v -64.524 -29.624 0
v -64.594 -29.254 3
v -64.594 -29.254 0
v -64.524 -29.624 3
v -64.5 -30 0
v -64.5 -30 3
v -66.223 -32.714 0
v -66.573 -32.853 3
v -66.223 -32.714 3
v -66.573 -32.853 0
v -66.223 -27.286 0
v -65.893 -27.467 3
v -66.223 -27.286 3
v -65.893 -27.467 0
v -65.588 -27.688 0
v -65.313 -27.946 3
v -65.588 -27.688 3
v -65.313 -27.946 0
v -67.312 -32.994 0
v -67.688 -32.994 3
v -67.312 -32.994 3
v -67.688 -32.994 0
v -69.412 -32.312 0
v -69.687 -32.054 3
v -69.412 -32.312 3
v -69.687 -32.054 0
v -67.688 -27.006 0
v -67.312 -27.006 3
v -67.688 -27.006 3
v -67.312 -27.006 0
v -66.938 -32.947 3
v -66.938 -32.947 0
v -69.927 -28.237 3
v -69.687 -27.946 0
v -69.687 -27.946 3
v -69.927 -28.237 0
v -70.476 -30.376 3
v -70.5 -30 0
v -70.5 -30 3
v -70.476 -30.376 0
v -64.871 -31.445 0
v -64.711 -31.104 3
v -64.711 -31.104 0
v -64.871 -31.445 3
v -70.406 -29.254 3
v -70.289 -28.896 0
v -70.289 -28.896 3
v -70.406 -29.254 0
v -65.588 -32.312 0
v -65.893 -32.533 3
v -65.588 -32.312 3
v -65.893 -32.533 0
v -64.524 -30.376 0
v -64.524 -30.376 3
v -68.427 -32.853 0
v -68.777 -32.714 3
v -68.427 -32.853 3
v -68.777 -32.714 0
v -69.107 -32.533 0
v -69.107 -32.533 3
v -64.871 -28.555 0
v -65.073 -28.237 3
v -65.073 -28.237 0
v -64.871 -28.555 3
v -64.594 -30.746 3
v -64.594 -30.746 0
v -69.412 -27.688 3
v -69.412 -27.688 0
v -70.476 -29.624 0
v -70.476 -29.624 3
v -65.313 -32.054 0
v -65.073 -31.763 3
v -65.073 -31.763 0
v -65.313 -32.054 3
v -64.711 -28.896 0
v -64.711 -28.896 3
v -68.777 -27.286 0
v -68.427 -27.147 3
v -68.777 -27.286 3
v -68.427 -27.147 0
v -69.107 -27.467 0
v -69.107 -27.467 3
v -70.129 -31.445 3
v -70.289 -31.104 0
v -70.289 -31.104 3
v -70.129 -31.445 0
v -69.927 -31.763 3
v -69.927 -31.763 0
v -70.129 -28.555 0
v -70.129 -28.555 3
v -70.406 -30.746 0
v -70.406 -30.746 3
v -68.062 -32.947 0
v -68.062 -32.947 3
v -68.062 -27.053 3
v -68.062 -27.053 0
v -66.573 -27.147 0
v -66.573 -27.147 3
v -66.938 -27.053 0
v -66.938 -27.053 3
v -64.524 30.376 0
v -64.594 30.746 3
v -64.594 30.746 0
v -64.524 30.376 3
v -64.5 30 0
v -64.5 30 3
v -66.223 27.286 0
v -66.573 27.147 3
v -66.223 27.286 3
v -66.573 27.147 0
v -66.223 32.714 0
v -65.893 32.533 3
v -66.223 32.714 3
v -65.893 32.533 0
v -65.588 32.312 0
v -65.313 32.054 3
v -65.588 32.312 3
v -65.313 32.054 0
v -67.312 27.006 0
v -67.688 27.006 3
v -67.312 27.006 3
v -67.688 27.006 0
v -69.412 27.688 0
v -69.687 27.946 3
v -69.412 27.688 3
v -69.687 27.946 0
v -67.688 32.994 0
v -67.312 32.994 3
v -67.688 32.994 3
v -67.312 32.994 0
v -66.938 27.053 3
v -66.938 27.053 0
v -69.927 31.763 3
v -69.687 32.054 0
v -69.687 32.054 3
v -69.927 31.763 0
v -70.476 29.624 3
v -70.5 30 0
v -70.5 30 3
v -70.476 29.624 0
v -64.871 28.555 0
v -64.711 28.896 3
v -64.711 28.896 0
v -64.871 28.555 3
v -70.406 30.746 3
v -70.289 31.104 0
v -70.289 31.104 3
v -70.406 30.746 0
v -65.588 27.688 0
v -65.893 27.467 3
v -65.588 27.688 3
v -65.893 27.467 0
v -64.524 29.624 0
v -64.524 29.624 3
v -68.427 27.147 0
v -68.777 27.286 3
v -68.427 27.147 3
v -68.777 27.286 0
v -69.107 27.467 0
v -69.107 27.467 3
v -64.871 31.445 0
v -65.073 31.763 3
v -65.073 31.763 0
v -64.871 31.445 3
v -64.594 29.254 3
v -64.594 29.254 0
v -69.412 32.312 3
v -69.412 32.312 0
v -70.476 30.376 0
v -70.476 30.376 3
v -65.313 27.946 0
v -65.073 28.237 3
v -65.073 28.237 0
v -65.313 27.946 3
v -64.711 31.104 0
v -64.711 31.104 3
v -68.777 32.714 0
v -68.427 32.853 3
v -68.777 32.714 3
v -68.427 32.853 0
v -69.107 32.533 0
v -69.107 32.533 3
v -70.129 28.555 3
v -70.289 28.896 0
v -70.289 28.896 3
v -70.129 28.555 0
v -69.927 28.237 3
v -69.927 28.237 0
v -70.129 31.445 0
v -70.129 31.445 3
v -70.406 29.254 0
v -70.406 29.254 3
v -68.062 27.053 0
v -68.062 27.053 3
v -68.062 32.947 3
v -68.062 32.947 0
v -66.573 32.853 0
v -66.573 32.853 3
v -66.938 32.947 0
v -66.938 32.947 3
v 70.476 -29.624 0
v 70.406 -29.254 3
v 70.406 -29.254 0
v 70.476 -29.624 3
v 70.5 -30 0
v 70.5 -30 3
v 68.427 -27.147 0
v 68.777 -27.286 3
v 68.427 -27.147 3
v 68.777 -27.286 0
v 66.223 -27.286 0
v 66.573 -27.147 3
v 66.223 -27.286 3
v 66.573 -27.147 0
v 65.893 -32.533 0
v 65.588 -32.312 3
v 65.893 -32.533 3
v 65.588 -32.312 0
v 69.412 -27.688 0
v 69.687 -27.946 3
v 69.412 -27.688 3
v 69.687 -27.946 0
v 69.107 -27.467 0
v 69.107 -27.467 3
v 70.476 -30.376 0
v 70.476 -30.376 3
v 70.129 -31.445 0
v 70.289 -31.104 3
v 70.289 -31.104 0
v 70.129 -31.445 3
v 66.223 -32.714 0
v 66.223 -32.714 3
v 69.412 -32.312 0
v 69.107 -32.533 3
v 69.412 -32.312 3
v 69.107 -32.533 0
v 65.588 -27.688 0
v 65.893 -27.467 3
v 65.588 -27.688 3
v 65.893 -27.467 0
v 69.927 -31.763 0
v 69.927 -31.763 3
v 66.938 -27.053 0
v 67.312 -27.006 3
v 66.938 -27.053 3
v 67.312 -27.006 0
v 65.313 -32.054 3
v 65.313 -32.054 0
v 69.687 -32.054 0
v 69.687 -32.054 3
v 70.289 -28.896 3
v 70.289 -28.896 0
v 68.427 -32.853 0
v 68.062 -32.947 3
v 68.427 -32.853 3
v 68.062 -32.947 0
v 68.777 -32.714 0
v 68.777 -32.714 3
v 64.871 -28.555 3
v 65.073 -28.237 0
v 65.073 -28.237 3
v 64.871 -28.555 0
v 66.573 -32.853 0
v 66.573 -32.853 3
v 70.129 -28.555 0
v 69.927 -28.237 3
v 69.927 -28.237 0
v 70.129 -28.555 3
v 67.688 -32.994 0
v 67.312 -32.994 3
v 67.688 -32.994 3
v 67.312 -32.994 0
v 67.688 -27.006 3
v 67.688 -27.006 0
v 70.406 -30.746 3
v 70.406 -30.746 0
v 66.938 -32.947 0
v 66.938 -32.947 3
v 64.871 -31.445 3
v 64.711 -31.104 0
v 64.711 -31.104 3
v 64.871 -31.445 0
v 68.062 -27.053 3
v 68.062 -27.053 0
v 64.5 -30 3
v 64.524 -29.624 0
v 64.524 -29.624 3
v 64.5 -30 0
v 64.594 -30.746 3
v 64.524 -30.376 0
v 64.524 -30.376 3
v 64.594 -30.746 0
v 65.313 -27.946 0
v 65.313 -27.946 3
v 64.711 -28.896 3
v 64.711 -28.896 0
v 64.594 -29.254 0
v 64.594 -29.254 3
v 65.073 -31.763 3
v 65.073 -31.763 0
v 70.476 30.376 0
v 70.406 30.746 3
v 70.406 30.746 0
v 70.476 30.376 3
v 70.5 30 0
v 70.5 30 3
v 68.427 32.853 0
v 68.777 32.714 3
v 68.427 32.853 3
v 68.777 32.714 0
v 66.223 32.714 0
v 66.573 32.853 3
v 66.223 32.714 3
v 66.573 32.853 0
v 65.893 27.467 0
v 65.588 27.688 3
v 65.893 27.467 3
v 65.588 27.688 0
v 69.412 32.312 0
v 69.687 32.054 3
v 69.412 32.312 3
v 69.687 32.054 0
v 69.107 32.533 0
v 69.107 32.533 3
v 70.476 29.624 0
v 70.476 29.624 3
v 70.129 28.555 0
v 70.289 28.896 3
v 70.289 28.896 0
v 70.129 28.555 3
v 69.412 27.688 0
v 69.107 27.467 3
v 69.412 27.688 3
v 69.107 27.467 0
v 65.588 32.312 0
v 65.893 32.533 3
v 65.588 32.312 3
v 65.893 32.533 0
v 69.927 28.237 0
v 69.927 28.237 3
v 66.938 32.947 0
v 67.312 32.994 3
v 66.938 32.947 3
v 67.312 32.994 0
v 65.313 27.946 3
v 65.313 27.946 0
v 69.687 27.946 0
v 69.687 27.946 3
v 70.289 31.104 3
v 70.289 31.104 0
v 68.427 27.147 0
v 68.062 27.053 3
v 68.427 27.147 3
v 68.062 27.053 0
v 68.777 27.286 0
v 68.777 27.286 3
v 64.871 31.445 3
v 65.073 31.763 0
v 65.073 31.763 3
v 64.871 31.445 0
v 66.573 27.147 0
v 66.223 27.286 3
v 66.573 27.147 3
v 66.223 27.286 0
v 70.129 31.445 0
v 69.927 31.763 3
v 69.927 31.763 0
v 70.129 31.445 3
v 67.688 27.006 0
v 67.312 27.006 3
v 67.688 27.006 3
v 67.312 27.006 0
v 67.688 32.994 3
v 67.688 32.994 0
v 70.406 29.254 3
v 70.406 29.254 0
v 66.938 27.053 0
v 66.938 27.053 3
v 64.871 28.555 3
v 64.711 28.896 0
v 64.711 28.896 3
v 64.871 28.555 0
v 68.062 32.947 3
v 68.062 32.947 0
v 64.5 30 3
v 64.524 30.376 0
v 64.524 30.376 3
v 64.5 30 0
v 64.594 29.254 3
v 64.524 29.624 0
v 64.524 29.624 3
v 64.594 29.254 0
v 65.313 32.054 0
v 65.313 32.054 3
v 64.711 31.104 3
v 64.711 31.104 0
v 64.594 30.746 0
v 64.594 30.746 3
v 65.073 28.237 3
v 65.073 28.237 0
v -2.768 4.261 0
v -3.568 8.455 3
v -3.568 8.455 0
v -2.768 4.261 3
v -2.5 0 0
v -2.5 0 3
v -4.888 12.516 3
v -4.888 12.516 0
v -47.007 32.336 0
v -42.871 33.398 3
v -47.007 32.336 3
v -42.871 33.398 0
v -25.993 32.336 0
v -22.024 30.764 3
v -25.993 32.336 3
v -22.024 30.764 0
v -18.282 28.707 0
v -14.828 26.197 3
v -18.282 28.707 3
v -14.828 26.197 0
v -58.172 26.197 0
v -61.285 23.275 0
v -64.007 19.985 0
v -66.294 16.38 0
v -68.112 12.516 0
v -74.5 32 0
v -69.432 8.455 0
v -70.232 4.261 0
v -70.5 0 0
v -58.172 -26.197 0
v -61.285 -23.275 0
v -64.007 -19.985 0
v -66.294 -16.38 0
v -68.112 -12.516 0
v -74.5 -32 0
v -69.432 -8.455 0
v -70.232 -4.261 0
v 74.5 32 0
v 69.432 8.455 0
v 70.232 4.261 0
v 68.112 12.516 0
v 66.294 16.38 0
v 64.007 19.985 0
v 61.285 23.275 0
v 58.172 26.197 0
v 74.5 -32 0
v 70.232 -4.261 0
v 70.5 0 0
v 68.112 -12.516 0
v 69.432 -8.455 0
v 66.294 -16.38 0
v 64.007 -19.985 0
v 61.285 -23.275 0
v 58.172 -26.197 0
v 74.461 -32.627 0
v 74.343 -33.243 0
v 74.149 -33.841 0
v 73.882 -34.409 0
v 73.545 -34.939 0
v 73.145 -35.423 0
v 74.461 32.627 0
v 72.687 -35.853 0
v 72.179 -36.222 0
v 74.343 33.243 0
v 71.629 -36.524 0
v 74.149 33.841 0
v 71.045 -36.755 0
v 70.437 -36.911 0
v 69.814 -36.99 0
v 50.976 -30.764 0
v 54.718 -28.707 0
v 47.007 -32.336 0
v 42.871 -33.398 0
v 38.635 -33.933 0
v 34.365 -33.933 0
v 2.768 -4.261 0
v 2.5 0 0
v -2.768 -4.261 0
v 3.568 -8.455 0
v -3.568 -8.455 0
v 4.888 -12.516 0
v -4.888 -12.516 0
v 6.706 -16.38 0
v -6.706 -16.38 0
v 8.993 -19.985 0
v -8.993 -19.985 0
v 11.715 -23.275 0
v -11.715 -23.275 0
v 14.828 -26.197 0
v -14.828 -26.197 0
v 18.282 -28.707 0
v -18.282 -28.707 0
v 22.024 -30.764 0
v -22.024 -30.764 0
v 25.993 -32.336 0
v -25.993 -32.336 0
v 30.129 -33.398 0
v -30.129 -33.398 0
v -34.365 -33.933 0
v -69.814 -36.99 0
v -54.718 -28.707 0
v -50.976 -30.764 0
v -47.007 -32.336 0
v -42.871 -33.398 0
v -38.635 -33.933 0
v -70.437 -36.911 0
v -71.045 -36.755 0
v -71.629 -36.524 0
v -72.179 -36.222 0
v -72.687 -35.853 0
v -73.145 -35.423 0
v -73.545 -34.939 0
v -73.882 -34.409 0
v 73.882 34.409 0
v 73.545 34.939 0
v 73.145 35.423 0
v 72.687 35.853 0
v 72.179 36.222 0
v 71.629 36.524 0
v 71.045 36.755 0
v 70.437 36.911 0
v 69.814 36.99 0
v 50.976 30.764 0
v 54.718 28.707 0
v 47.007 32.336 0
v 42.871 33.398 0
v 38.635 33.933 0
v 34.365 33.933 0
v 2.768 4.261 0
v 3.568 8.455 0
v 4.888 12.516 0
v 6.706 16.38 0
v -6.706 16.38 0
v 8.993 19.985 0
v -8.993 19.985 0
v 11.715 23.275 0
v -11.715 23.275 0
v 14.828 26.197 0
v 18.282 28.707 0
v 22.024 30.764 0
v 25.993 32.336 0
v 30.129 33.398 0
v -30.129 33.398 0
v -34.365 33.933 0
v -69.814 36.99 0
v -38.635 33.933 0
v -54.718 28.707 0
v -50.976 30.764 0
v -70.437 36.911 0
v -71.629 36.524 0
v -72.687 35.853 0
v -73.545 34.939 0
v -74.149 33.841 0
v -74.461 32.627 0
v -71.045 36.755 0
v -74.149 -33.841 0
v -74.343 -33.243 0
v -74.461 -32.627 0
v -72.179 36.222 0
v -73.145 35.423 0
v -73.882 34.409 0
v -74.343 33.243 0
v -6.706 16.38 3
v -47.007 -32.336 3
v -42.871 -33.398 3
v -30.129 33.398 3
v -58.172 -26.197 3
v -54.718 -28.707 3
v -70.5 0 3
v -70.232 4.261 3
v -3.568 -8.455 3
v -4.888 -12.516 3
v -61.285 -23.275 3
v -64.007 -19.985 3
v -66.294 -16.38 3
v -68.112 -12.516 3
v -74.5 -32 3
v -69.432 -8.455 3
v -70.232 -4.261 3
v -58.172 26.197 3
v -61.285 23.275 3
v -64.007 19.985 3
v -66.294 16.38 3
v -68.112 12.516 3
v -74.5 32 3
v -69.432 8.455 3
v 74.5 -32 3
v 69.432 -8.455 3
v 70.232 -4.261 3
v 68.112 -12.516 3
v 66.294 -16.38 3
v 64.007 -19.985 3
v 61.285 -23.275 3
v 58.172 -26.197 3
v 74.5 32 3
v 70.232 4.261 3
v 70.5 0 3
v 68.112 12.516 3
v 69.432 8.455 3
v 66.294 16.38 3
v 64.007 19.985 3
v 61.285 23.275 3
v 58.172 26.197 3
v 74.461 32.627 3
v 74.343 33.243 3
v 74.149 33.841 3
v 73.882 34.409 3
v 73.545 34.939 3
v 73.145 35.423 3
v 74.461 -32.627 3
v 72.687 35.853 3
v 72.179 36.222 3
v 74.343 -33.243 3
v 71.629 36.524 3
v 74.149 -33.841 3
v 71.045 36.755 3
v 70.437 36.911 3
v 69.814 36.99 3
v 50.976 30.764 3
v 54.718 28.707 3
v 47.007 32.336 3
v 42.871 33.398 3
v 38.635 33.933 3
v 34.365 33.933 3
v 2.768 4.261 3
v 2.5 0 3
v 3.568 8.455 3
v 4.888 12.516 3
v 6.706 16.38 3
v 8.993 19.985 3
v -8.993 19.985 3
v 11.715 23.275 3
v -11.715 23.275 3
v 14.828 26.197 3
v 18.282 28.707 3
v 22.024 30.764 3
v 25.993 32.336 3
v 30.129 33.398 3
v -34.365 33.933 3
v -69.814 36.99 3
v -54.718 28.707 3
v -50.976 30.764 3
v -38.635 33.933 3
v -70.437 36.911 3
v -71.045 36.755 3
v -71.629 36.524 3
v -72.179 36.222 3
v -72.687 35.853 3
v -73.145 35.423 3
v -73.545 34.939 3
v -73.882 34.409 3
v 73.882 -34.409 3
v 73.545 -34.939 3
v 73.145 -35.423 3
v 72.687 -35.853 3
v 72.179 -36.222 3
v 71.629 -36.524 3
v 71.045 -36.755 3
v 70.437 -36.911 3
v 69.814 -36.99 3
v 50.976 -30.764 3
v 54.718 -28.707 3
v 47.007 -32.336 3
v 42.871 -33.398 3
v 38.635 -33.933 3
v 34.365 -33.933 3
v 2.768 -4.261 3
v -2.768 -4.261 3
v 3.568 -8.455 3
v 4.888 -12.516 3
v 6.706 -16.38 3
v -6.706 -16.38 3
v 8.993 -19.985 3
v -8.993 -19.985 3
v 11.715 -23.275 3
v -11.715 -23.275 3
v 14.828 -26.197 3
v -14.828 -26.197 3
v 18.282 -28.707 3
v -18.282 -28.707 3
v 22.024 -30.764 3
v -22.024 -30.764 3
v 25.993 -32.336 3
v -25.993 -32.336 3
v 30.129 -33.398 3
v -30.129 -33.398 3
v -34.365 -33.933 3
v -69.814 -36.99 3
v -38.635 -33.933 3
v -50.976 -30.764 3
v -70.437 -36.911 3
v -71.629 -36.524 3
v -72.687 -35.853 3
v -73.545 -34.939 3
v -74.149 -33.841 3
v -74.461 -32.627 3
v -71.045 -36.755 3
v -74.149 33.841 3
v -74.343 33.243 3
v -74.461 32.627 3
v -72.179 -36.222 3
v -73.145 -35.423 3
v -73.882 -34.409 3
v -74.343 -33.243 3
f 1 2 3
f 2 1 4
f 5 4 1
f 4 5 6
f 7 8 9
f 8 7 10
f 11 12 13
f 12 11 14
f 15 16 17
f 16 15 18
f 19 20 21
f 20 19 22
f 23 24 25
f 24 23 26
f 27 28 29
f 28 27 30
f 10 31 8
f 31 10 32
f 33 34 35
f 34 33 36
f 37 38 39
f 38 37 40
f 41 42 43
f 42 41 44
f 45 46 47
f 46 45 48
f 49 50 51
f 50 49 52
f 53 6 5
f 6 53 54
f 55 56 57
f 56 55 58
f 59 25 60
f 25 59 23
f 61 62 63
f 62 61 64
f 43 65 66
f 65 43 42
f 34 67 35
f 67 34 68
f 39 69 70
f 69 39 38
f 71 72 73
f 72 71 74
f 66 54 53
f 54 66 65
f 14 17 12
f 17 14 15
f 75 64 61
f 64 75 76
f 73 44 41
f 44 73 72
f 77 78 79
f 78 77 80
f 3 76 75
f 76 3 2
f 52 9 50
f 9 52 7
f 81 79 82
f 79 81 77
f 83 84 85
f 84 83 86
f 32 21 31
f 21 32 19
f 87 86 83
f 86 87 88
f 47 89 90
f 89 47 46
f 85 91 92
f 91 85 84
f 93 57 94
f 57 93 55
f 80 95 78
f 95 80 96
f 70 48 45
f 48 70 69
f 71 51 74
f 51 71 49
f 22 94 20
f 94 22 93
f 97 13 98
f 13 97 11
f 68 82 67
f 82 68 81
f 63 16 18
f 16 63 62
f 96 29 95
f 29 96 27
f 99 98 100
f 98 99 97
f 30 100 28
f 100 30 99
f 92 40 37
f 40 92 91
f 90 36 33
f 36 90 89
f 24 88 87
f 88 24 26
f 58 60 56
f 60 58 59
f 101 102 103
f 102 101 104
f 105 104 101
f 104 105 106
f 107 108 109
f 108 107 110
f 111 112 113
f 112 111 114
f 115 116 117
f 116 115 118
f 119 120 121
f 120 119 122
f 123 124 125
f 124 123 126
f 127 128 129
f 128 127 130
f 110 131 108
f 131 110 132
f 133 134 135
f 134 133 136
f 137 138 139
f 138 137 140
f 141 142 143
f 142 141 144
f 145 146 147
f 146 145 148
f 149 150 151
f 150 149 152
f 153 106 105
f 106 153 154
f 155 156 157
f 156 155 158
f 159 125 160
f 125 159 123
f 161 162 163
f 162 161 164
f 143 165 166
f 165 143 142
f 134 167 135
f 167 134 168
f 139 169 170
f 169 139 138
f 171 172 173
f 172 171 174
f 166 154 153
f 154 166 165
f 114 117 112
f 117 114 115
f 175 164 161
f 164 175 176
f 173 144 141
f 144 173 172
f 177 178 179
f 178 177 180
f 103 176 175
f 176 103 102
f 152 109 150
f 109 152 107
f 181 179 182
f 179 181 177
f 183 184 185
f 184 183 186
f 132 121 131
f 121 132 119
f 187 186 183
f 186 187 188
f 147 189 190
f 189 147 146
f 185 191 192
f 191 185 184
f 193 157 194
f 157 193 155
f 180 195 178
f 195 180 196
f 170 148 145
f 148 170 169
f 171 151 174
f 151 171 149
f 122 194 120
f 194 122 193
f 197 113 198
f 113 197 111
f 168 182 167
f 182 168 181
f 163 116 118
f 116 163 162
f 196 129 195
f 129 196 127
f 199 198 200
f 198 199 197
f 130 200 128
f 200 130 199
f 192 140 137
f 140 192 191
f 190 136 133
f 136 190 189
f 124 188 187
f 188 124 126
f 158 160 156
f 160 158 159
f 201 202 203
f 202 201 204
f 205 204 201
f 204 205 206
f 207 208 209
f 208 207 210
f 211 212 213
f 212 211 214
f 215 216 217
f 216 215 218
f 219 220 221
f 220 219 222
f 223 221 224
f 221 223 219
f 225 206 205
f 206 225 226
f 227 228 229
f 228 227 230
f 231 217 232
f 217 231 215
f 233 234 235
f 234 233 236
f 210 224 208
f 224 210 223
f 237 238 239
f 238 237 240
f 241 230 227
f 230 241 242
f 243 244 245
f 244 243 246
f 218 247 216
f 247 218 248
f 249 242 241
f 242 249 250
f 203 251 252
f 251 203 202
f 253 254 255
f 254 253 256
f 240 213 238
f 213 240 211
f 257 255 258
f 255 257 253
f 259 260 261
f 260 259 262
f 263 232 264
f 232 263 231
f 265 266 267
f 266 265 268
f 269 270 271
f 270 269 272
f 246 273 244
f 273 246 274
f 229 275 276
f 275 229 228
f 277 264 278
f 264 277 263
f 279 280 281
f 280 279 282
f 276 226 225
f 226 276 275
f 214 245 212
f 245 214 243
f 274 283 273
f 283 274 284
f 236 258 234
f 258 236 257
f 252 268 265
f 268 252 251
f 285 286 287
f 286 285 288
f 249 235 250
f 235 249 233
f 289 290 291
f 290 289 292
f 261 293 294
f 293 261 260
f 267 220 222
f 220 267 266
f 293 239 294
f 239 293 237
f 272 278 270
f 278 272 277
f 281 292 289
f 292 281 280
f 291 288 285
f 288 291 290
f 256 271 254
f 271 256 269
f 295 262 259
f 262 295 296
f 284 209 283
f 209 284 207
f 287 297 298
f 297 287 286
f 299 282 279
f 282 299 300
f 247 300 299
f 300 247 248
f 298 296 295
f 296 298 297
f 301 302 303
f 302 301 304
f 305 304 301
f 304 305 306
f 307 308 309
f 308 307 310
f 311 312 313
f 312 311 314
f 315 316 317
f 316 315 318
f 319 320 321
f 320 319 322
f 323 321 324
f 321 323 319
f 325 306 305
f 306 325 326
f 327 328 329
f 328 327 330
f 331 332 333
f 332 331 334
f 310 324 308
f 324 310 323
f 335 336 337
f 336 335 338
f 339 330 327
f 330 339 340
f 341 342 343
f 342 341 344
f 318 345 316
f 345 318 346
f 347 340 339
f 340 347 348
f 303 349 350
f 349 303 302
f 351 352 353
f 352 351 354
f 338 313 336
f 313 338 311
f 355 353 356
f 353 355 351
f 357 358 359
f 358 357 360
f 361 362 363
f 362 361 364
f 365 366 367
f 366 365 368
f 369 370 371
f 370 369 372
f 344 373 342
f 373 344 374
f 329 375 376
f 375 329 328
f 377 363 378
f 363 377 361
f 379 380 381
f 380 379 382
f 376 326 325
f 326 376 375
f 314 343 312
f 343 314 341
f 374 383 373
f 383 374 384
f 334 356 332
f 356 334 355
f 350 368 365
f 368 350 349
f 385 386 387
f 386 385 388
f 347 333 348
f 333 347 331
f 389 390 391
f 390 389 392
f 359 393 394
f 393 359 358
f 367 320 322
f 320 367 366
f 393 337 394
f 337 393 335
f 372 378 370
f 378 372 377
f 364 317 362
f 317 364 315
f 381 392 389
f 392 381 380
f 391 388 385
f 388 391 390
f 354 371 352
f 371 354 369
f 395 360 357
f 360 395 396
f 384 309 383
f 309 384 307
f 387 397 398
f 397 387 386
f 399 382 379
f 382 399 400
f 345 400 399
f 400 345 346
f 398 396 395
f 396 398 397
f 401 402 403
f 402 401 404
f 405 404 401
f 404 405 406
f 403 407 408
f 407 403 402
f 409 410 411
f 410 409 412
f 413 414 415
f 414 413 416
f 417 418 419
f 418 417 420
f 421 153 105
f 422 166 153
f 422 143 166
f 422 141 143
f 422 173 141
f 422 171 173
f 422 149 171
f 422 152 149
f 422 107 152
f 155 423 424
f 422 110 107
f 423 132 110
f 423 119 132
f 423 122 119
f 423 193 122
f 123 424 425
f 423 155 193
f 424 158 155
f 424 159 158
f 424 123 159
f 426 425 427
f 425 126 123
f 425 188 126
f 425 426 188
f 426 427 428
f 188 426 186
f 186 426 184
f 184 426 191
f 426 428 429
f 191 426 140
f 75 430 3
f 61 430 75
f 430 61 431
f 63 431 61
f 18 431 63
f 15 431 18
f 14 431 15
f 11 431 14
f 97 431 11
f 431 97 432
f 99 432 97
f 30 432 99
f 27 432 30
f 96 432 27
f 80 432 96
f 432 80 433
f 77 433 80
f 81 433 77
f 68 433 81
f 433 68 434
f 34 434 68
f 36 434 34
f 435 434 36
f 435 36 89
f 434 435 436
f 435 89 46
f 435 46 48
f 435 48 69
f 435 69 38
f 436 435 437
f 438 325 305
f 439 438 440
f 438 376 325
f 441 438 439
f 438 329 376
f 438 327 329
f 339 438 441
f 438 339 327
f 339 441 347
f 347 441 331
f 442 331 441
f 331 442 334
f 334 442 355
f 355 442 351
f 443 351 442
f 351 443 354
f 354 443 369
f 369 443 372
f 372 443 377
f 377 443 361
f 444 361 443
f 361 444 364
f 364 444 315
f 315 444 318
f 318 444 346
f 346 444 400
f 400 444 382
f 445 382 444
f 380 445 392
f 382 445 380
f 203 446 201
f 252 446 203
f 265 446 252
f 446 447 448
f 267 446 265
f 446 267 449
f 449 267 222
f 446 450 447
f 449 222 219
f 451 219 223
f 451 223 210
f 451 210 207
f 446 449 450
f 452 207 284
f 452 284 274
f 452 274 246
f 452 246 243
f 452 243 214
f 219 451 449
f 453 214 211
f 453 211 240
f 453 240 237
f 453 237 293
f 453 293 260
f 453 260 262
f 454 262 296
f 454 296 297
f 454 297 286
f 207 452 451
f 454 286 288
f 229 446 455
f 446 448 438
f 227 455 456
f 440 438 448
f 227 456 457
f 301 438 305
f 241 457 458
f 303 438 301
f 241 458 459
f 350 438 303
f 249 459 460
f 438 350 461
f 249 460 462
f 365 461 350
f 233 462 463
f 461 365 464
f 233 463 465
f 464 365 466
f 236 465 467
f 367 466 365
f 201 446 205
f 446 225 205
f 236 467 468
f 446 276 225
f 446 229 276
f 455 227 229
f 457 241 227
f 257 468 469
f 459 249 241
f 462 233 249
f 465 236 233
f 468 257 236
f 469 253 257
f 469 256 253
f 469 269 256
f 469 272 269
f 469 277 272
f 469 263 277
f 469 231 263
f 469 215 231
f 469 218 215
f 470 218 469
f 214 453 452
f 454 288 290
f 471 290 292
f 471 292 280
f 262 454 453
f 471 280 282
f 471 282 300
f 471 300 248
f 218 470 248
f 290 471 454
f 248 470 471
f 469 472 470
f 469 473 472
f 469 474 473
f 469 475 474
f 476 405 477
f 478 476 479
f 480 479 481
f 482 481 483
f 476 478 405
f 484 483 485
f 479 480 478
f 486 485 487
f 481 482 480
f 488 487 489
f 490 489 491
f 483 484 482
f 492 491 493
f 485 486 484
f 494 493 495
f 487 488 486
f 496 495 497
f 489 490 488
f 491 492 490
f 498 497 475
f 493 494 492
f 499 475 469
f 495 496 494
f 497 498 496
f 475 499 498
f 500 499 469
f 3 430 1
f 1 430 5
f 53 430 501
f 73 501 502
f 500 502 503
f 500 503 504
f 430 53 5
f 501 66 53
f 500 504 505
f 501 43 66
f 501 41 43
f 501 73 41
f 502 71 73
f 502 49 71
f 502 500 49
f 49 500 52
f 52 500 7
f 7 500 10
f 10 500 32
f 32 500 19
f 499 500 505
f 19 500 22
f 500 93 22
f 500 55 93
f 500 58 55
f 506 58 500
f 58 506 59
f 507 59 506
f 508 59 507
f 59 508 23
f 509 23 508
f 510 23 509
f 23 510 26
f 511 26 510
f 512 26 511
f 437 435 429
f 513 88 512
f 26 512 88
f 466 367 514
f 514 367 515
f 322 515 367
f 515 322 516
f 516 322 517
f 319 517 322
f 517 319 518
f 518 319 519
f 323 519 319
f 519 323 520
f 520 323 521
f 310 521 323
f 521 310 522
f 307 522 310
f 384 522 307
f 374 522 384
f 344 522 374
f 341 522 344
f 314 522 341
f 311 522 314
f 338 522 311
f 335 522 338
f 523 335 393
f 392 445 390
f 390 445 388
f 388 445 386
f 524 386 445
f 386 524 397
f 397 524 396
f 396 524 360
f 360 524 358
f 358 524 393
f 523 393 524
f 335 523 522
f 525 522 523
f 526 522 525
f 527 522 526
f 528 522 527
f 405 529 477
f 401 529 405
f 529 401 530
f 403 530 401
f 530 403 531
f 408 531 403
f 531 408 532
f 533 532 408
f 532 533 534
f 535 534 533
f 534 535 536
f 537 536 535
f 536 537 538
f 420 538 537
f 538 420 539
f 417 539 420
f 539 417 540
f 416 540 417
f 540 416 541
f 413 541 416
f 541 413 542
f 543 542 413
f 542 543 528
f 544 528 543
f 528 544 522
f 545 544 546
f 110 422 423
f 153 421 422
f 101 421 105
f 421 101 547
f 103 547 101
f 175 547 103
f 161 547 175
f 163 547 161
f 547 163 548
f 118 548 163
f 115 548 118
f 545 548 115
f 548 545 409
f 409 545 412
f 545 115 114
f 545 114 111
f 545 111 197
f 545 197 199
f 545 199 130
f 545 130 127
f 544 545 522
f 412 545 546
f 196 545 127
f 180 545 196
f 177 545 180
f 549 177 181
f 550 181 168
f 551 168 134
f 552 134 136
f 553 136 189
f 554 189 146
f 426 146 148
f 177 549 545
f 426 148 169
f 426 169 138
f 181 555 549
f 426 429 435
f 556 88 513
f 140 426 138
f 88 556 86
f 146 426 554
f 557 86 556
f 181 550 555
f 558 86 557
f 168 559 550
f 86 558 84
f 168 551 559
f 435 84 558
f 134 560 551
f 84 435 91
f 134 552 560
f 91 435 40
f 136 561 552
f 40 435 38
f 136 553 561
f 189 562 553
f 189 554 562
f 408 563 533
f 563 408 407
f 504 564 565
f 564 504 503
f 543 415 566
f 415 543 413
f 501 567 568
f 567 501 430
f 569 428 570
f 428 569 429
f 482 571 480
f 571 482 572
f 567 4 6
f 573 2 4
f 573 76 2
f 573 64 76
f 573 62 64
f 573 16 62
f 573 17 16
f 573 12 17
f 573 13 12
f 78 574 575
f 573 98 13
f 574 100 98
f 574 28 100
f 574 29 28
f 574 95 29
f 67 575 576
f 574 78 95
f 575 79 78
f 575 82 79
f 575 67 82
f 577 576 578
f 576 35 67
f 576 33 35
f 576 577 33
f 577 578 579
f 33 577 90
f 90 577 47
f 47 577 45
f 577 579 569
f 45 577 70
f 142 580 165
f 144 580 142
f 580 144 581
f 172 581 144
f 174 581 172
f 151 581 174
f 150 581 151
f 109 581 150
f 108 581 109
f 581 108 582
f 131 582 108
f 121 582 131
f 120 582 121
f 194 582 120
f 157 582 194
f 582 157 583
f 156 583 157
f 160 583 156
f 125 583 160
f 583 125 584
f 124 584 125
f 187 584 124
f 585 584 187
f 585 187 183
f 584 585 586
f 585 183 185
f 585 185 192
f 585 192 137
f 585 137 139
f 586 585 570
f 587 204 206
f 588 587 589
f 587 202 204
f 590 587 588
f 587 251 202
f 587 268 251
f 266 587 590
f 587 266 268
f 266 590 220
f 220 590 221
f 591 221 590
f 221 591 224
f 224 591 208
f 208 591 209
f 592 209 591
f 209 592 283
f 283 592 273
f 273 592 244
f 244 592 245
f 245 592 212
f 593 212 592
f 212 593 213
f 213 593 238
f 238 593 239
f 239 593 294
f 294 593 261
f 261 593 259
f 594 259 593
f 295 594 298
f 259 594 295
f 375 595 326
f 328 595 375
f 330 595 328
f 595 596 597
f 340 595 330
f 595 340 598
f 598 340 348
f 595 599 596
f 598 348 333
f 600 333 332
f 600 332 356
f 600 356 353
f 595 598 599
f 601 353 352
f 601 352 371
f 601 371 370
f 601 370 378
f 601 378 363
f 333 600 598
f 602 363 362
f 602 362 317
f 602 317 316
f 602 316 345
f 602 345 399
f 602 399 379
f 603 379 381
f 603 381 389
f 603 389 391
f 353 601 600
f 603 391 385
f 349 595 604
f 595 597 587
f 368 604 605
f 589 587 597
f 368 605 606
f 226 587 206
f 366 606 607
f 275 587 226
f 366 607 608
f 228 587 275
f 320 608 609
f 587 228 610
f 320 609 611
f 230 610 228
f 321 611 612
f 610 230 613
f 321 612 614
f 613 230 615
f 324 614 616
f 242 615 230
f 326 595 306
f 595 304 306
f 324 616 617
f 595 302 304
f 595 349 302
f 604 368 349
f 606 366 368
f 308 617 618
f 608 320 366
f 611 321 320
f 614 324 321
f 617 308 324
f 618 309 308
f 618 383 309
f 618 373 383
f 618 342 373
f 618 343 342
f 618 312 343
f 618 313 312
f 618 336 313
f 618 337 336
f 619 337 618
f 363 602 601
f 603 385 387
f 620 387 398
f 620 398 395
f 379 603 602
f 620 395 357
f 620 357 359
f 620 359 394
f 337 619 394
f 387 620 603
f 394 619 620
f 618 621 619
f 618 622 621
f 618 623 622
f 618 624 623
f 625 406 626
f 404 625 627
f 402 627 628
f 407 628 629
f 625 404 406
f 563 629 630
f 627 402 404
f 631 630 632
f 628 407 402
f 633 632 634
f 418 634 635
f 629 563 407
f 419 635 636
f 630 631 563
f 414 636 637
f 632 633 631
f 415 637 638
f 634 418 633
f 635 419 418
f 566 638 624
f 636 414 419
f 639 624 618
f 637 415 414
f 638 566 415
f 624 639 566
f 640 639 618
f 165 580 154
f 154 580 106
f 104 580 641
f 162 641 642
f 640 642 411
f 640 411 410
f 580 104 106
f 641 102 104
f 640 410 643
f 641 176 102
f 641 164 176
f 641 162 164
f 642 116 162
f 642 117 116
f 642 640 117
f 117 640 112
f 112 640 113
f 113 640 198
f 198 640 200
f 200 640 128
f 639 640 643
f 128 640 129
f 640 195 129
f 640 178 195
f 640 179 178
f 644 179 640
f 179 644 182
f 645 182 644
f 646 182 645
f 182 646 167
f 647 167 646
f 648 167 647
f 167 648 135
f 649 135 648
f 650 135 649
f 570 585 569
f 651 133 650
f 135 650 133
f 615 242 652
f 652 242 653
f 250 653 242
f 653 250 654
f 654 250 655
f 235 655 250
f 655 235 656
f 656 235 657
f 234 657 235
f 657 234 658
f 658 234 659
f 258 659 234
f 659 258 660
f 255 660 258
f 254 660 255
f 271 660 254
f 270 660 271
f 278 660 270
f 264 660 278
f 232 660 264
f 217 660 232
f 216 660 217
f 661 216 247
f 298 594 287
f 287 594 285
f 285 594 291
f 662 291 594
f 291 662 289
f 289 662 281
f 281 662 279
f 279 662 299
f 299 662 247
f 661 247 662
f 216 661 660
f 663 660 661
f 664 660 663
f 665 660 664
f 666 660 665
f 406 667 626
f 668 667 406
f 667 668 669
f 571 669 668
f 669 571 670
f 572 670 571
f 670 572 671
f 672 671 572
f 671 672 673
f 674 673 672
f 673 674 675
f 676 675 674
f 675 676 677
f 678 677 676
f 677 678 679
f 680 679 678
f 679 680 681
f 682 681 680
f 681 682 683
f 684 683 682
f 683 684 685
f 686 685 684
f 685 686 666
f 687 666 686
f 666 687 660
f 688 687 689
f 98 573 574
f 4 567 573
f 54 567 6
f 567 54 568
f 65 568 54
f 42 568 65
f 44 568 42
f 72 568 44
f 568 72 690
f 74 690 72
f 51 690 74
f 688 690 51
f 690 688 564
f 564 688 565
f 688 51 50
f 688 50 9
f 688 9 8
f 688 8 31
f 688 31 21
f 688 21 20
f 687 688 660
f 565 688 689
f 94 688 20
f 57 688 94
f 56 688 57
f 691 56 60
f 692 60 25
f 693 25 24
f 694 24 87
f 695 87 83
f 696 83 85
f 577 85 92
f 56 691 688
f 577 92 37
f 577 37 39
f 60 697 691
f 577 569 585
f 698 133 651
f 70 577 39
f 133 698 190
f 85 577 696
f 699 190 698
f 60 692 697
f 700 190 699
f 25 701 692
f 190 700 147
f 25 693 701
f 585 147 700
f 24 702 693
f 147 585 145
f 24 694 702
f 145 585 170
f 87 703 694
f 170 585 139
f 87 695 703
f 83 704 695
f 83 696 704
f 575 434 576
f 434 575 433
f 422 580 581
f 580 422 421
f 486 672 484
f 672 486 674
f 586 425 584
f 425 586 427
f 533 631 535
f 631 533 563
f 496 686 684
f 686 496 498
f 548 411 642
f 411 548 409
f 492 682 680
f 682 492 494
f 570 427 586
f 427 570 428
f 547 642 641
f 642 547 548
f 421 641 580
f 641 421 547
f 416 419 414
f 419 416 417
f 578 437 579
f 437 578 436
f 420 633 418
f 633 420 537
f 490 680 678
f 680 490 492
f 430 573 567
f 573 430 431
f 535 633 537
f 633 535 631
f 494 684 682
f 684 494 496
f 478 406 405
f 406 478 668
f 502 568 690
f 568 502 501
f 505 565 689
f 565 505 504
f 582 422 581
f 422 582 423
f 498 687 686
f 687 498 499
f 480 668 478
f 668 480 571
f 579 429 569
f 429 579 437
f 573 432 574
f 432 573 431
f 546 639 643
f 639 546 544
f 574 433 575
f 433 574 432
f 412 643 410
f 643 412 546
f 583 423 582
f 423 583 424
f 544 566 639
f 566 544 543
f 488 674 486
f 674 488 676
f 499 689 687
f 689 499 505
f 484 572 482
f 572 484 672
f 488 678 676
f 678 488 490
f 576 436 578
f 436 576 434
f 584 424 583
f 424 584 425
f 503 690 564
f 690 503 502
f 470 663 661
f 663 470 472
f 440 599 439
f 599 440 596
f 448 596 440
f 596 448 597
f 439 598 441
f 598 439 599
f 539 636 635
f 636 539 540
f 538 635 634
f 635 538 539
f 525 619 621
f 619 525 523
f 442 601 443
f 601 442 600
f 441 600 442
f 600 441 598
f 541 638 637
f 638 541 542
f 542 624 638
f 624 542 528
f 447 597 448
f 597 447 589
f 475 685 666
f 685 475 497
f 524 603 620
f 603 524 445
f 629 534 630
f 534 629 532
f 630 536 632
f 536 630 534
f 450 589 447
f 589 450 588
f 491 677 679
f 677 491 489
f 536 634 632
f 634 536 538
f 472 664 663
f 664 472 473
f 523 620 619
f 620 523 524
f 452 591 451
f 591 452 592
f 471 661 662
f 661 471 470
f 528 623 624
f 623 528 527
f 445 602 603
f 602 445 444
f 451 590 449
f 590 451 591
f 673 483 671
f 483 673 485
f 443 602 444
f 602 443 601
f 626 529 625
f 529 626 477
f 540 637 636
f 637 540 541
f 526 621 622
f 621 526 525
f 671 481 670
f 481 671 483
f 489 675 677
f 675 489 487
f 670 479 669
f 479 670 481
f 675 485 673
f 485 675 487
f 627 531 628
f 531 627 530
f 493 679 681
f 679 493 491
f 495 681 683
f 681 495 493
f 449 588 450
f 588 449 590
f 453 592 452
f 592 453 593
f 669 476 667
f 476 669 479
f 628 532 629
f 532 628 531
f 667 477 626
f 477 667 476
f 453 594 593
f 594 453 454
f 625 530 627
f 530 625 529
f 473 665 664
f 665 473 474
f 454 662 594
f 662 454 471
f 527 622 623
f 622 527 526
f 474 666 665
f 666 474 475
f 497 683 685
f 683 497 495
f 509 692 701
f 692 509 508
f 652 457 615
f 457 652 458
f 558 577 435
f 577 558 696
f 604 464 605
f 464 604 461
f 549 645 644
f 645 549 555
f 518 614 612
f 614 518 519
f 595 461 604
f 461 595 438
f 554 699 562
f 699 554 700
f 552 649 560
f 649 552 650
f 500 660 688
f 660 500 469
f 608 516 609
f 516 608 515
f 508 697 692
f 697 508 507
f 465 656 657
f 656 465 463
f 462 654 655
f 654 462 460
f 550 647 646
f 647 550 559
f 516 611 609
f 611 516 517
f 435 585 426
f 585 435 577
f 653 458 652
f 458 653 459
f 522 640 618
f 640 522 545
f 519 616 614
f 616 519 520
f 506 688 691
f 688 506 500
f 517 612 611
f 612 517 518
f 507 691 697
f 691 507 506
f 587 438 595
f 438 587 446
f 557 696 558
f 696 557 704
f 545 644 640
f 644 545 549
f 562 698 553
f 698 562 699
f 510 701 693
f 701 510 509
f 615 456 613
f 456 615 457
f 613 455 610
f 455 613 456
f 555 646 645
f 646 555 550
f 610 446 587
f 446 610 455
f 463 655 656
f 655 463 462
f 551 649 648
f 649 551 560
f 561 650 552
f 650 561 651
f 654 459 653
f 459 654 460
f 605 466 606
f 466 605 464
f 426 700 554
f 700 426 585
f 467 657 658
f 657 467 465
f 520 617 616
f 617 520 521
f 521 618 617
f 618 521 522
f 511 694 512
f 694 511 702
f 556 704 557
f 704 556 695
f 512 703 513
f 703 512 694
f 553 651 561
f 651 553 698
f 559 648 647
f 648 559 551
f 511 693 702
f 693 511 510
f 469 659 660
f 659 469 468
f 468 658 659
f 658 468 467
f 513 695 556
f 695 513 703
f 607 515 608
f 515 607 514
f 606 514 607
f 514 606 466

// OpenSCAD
$fn = 50;


difference() {
	union() {
		hull() {
			translate(v = [-69.5000000000, 32.0000000000, 0]) {
				cylinder(h = 3, r = 5);
			}
			translate(v = [69.5000000000, 32.0000000000, 0]) {
				cylinder(h = 3, r = 5);
			}
			translate(v = [-69.5000000000, -32.0000000000, 0]) {
				cylinder(h = 3, r = 5);
			}
			translate(v = [69.5000000000, -32.0000000000, 0]) {
				cylinder(h = 3, r = 5);
			}
		}
	}
	union() {
		#translate(v = [-67.5000000000, -30.0000000000, -100.0000000000]) {
			cylinder(h = 200, r = 3.0000000000);
		}
		#translate(v = [-67.5000000000, 30.0000000000, -100.0000000000]) {
			cylinder(h = 200, r = 3.0000000000);
		}
		#translate(v = [67.5000000000, -30.0000000000, -100.0000000000]) {
			cylinder(h = 200, r = 3.0000000000);
		}
		#translate(v = [67.5000000000, 30.0000000000, -100.0000000000]) {
			cylinder(h = 200, r = 3.0000000000);
		}
		#translate(v = [-36.5000000000, 0, 0]) {
			cylinder(h = 3, r = 34.0000000000);
		}
		#translate(v = [36.5000000000, 0, 0]) {
			cylinder(h = 3, r = 34.0000000000);
		}
	}
}
